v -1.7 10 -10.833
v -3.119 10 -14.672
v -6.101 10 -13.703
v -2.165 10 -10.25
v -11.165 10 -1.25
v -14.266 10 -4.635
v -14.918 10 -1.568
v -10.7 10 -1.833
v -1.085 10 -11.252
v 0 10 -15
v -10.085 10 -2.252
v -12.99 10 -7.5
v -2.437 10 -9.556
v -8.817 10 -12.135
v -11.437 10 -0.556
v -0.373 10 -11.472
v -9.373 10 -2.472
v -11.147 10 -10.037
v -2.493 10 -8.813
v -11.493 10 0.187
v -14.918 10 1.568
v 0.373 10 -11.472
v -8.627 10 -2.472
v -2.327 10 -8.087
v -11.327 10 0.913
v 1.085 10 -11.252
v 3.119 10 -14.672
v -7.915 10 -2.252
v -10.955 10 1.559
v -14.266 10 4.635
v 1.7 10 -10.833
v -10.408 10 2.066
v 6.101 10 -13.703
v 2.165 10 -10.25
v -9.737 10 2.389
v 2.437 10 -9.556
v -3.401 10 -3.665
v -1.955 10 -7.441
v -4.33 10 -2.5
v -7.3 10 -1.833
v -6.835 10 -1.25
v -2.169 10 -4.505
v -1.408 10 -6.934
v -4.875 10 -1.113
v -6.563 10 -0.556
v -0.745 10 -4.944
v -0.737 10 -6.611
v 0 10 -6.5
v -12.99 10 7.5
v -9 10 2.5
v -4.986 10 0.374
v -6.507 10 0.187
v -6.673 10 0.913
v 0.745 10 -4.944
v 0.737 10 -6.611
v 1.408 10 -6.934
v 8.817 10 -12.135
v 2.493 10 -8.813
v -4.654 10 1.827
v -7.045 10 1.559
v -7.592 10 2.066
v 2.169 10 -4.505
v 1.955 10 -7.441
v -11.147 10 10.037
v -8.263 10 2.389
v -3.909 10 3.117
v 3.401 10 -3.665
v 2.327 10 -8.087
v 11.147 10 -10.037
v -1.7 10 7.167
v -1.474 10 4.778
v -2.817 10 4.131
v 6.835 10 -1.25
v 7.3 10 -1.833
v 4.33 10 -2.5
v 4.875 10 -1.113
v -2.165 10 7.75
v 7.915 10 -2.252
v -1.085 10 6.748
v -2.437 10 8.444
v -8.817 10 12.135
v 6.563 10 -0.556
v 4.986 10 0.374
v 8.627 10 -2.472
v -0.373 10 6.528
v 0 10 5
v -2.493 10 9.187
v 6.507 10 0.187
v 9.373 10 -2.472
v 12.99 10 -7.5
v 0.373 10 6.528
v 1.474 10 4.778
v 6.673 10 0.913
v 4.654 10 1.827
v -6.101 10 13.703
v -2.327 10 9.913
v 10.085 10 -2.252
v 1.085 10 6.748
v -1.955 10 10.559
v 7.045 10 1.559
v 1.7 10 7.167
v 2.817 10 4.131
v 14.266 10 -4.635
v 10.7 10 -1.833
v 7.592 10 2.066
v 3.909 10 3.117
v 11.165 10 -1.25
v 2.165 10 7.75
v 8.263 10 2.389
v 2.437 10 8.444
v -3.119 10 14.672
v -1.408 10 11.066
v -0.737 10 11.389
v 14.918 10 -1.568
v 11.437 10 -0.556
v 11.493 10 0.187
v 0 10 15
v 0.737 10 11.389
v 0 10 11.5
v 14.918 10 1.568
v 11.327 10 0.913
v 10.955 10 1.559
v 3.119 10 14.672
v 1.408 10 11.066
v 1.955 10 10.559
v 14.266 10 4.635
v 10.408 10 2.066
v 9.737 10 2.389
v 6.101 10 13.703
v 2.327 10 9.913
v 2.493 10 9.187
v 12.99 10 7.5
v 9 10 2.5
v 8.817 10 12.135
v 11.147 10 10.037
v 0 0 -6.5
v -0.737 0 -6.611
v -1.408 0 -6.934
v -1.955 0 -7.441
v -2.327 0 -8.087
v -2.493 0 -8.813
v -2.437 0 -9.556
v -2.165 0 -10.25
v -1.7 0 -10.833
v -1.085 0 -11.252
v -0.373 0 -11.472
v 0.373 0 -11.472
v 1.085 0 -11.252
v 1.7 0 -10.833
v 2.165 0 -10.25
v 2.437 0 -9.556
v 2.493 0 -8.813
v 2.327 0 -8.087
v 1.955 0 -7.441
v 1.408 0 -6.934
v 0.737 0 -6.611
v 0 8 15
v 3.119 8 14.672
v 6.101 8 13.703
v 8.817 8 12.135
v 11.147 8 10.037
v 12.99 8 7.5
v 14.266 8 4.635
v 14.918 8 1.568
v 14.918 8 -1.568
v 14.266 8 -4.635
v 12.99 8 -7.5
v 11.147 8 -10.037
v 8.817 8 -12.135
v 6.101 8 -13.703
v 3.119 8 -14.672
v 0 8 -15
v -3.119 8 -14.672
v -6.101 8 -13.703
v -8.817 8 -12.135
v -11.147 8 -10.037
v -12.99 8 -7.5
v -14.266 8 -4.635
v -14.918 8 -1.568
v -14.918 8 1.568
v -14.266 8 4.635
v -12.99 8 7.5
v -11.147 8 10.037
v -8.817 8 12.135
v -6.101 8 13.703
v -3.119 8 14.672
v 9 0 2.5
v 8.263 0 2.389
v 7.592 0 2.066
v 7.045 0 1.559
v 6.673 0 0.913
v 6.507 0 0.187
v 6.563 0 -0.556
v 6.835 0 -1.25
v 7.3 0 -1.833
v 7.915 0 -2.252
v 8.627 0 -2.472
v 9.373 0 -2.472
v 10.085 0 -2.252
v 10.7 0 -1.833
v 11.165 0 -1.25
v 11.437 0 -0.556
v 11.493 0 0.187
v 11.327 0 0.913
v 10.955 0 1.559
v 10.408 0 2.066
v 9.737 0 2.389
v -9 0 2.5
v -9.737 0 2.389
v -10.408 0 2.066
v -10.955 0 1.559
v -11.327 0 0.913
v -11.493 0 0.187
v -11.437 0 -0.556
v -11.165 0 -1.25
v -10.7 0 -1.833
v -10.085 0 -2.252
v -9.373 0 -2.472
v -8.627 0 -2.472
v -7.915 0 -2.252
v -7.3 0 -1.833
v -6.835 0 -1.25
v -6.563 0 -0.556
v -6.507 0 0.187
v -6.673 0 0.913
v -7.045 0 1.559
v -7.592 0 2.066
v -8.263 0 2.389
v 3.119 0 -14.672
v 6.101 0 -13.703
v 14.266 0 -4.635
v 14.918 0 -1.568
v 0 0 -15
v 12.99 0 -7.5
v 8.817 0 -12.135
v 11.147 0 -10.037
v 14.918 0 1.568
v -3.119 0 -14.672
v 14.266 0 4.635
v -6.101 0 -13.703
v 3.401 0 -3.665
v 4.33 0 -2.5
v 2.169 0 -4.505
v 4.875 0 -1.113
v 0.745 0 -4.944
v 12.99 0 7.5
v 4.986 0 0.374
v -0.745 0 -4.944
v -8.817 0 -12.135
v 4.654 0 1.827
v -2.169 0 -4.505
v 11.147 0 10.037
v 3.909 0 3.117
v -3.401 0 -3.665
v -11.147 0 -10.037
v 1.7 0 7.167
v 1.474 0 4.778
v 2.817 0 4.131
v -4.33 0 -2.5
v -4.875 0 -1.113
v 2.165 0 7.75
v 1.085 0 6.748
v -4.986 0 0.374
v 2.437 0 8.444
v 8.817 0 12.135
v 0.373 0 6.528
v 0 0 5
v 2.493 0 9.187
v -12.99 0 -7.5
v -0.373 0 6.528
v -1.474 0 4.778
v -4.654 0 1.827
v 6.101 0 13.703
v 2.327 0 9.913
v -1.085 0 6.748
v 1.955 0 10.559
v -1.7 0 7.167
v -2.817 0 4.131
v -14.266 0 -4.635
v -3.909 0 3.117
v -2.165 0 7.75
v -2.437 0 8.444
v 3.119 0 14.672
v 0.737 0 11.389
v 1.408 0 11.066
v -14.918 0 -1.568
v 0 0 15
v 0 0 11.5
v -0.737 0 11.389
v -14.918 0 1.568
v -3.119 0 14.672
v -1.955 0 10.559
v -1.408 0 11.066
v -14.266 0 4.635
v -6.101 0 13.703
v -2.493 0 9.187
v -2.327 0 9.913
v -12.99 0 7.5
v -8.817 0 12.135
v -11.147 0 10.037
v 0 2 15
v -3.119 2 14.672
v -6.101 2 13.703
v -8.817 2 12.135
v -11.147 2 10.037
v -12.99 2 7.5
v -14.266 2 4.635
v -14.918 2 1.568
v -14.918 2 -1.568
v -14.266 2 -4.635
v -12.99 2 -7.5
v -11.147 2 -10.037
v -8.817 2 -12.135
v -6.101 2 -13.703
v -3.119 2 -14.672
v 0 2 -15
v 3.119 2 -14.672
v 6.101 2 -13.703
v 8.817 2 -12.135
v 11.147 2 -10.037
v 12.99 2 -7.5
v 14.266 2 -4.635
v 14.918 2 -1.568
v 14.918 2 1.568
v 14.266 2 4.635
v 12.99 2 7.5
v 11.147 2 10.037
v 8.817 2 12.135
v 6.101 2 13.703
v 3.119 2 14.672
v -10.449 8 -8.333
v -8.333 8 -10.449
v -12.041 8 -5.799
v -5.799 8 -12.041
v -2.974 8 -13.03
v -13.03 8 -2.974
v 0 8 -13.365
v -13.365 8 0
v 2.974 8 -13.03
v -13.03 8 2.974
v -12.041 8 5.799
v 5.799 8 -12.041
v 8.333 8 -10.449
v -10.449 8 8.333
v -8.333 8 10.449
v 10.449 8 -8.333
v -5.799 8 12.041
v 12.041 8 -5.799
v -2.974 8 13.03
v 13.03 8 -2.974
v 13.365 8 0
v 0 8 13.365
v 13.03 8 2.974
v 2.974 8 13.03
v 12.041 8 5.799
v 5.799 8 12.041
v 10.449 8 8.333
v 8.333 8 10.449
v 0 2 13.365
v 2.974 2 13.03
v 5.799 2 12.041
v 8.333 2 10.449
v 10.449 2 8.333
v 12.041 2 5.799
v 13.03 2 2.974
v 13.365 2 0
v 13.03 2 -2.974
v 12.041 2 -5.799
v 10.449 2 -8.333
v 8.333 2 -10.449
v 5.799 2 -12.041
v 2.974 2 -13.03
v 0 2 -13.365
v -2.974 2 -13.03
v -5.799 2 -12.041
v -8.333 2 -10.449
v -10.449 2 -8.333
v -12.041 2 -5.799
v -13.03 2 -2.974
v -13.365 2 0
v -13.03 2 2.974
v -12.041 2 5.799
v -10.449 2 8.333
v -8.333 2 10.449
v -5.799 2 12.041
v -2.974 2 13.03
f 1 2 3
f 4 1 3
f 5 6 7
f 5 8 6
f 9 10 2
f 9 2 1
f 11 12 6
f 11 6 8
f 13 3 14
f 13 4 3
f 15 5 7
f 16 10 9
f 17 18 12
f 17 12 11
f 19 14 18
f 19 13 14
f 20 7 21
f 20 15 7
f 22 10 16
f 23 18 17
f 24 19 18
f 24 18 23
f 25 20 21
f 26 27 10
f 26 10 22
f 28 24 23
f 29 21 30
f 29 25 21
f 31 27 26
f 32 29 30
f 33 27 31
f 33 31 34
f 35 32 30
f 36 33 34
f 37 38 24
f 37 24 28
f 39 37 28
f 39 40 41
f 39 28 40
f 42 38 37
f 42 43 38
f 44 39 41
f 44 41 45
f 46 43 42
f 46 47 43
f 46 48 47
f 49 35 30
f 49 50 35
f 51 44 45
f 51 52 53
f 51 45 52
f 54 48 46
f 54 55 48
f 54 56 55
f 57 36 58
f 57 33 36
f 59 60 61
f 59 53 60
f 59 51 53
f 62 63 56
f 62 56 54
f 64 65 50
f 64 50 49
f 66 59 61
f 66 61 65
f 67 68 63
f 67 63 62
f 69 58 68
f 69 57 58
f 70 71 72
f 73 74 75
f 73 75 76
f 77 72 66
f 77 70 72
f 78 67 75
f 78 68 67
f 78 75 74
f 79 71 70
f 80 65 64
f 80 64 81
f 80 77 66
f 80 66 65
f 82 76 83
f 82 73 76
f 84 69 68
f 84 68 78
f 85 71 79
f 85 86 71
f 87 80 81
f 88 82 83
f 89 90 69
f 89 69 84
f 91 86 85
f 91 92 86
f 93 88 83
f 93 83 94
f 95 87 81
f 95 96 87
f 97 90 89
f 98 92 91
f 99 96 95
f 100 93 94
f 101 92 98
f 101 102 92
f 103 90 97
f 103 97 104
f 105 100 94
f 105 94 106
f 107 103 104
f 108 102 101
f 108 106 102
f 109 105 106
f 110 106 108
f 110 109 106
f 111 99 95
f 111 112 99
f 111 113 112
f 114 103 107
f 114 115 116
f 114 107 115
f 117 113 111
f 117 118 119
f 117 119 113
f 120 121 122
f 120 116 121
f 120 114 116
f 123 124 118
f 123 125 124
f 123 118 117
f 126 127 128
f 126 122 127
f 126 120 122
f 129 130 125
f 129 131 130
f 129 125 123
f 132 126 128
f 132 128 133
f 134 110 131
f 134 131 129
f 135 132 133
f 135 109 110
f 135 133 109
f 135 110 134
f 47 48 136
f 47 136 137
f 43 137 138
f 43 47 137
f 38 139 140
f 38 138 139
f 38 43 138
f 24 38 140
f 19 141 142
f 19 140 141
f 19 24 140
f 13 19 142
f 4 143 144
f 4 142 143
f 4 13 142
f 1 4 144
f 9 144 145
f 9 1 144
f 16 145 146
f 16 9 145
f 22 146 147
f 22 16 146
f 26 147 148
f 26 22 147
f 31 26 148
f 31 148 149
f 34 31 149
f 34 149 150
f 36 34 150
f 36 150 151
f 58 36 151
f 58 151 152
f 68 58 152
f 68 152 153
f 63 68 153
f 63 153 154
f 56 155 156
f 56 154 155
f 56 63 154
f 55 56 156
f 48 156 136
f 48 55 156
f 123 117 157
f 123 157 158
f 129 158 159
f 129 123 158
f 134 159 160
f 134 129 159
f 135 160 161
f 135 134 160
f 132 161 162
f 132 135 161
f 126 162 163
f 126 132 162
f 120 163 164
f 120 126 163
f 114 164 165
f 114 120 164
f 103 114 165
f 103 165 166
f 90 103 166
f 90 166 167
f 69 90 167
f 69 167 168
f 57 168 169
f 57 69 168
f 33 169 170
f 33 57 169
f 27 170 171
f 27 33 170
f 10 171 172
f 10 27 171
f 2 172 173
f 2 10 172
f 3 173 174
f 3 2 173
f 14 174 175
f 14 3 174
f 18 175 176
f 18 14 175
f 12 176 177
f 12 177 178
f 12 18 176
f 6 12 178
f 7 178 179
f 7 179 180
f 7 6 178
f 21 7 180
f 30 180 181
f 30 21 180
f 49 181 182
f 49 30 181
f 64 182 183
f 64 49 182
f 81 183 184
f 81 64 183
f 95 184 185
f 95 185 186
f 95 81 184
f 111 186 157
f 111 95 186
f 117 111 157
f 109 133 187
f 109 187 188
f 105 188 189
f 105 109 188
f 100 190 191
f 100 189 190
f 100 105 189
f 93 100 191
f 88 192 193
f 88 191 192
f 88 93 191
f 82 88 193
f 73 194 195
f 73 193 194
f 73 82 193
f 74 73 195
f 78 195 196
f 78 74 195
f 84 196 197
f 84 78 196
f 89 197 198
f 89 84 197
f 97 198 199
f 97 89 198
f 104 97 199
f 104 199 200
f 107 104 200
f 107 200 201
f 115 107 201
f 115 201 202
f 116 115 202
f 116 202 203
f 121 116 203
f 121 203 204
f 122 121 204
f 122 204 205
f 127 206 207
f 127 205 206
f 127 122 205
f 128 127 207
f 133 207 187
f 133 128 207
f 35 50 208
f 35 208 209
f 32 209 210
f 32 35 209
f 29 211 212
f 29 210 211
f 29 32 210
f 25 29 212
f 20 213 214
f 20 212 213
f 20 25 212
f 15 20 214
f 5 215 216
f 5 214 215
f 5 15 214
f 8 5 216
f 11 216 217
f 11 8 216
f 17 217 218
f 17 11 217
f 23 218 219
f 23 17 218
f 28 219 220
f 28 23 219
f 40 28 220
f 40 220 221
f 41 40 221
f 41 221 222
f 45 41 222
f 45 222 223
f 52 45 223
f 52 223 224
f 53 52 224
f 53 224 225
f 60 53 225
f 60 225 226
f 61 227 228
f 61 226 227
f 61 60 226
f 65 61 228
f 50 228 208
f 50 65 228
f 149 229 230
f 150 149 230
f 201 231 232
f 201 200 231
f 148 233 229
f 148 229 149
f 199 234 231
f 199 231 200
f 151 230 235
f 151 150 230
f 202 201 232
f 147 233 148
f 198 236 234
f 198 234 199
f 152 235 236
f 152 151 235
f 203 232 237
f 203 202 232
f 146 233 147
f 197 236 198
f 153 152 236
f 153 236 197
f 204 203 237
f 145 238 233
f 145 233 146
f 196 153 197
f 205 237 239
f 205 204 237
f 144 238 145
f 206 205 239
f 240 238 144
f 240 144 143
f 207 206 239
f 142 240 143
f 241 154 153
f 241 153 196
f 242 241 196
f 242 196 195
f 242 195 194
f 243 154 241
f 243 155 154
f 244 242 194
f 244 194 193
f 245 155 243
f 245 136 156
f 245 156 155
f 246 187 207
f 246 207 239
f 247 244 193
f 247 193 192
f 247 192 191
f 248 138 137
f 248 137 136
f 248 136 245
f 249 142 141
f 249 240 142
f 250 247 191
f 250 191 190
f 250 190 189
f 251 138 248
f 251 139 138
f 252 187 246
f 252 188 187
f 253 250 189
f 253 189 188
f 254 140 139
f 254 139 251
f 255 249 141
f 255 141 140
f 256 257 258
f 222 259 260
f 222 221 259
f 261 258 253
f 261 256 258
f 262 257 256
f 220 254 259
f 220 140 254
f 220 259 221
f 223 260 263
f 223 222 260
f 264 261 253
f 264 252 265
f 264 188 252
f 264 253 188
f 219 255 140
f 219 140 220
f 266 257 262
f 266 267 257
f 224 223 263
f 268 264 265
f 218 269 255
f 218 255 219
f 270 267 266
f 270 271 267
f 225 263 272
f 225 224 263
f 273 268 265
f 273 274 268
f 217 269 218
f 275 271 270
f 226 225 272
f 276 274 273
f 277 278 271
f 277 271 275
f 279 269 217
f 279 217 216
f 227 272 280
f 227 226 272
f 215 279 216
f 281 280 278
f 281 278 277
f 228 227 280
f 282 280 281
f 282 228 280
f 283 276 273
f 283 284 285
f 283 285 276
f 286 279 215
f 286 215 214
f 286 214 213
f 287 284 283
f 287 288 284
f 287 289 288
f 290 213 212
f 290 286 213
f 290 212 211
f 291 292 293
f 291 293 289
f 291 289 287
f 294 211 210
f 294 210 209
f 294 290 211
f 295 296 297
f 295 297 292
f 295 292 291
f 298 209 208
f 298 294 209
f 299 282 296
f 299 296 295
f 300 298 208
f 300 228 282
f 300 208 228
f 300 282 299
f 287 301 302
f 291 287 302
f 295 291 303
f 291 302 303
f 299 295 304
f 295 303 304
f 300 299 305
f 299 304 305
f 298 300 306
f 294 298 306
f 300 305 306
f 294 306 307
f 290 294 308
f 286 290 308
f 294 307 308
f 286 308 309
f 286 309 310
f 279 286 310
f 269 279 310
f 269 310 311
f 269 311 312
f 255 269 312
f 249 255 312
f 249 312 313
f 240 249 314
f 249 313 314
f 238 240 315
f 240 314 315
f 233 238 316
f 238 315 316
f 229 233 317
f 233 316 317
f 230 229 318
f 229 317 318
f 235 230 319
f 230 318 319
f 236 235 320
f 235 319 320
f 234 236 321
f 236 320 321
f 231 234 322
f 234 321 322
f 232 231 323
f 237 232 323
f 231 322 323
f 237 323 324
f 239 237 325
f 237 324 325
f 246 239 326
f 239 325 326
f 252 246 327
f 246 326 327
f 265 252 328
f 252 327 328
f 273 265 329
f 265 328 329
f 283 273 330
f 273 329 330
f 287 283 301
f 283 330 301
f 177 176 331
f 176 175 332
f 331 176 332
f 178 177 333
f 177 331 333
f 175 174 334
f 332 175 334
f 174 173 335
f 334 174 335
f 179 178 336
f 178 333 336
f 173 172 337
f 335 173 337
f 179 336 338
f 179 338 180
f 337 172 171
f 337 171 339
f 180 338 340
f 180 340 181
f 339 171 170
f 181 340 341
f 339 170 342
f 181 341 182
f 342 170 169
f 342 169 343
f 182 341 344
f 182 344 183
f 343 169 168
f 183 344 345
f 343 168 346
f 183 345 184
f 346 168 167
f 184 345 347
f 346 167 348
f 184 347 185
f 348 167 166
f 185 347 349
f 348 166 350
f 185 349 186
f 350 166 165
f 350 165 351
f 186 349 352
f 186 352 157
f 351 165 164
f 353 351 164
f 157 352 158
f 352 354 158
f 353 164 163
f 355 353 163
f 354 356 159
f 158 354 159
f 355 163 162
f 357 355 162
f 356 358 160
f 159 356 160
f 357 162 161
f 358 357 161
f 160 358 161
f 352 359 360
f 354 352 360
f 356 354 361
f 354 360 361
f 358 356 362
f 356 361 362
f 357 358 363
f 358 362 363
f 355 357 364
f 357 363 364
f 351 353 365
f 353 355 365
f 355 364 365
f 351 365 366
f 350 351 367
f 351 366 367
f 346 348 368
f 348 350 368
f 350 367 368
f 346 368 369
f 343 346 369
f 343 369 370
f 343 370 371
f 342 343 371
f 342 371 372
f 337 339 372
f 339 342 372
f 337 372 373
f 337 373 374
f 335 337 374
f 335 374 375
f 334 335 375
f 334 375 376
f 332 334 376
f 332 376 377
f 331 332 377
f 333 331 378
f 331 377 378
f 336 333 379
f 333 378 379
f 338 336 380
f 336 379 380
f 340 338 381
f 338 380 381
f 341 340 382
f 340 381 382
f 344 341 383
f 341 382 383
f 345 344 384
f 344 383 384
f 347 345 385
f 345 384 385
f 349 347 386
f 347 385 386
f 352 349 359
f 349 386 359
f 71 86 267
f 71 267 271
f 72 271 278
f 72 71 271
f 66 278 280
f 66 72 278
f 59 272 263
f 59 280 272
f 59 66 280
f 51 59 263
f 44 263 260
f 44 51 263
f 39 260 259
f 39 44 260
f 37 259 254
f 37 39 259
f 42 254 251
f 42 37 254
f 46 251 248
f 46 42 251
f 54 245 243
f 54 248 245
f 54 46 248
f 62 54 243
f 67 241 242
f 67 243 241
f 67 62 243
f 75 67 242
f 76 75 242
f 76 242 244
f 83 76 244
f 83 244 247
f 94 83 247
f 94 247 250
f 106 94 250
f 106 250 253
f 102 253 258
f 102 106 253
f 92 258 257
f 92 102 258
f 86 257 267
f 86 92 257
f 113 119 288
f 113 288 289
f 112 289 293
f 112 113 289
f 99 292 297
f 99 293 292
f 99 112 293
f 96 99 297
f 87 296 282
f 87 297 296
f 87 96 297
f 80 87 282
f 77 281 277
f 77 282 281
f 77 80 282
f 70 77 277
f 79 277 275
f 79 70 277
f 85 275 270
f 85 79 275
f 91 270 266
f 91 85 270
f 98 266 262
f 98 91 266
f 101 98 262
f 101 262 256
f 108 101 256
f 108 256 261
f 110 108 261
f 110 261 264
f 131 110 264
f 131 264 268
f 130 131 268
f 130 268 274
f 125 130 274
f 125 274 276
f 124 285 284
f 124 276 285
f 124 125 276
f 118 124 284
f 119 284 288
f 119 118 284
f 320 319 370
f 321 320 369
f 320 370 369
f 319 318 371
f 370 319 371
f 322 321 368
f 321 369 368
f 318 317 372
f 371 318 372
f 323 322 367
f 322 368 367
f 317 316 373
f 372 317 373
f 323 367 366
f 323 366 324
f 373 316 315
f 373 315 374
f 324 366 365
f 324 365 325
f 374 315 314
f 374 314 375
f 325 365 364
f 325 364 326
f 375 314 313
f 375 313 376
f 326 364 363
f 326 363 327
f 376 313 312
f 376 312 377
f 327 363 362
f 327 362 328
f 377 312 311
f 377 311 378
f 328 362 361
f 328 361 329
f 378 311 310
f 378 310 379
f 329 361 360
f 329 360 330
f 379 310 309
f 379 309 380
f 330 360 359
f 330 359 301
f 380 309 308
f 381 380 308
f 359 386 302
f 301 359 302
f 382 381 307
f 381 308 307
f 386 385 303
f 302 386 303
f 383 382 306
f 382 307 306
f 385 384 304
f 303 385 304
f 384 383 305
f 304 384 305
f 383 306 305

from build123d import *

# Parameters (mm, degrees)
SKETCH1_R               = 13.365
BOSS_EXTRUDE1_DEPTH     = 10
SKETCH2_R               = 15
BOSS_EXTRUDE2_DEPTH     = 2
BOSS_EXTRUDE3_START     = -2
SKETCH3_R               = 15
BOSS_EXTRUDE3_DEPTH     = 2
CUT_EXTRUDE1_DEPTH      = 10
CUT_EXTRUDE1_DEPTH_BACK = 24.452078799
SKETCH4_R               = 5
SKETCH4_R_2             = 2.5


with BuildPart() as part:
    # Sketch1 → Boss-Extrude1 (new body)
    with BuildSketch(Plane(origin=(0, 0, 0), x_dir=(1, 0, 0), z_dir=(0, 1, 0))):
        Circle(SKETCH1_R)
    extrude(amount=BOSS_EXTRUDE1_DEPTH)

    # Sketch2 → Boss-Extrude2 (add)
    with BuildSketch(Plane(origin=(0, 10, 0), x_dir=(1, 0, 0), z_dir=(0, 1, 0))):
        Circle(SKETCH2_R)
    extrude(amount=-BOSS_EXTRUDE2_DEPTH)

    # Sketch3 → Boss-Extrude3 (add)
    with BuildSketch(Plane.XZ.offset(BOSS_EXTRUDE3_START)):
        Circle(SKETCH3_R)
    extrude(amount=BOSS_EXTRUDE3_DEPTH)

    # Sketch4 → Cut-Extrude1 (cut, two sides: drawn at the far end of the back side and taken through both)
    with BuildSketch(Plane.XZ.offset(-CUT_EXTRUDE1_DEPTH_BACK)):
        Circle(SKETCH4_R)
        with Locations((9, 0)):
            Circle(SKETCH4_R_2)
        with Locations((0, 9)):
            Circle(SKETCH4_R_2)
        with Locations((0, -9)):
            Circle(SKETCH4_R_2)
        with Locations((-9, 0)):
            Circle(SKETCH4_R_2)
    extrude(amount=CUT_EXTRUDE1_DEPTH + CUT_EXTRUDE1_DEPTH_BACK, mode=Mode.SUBTRACT)


solid = part.part
